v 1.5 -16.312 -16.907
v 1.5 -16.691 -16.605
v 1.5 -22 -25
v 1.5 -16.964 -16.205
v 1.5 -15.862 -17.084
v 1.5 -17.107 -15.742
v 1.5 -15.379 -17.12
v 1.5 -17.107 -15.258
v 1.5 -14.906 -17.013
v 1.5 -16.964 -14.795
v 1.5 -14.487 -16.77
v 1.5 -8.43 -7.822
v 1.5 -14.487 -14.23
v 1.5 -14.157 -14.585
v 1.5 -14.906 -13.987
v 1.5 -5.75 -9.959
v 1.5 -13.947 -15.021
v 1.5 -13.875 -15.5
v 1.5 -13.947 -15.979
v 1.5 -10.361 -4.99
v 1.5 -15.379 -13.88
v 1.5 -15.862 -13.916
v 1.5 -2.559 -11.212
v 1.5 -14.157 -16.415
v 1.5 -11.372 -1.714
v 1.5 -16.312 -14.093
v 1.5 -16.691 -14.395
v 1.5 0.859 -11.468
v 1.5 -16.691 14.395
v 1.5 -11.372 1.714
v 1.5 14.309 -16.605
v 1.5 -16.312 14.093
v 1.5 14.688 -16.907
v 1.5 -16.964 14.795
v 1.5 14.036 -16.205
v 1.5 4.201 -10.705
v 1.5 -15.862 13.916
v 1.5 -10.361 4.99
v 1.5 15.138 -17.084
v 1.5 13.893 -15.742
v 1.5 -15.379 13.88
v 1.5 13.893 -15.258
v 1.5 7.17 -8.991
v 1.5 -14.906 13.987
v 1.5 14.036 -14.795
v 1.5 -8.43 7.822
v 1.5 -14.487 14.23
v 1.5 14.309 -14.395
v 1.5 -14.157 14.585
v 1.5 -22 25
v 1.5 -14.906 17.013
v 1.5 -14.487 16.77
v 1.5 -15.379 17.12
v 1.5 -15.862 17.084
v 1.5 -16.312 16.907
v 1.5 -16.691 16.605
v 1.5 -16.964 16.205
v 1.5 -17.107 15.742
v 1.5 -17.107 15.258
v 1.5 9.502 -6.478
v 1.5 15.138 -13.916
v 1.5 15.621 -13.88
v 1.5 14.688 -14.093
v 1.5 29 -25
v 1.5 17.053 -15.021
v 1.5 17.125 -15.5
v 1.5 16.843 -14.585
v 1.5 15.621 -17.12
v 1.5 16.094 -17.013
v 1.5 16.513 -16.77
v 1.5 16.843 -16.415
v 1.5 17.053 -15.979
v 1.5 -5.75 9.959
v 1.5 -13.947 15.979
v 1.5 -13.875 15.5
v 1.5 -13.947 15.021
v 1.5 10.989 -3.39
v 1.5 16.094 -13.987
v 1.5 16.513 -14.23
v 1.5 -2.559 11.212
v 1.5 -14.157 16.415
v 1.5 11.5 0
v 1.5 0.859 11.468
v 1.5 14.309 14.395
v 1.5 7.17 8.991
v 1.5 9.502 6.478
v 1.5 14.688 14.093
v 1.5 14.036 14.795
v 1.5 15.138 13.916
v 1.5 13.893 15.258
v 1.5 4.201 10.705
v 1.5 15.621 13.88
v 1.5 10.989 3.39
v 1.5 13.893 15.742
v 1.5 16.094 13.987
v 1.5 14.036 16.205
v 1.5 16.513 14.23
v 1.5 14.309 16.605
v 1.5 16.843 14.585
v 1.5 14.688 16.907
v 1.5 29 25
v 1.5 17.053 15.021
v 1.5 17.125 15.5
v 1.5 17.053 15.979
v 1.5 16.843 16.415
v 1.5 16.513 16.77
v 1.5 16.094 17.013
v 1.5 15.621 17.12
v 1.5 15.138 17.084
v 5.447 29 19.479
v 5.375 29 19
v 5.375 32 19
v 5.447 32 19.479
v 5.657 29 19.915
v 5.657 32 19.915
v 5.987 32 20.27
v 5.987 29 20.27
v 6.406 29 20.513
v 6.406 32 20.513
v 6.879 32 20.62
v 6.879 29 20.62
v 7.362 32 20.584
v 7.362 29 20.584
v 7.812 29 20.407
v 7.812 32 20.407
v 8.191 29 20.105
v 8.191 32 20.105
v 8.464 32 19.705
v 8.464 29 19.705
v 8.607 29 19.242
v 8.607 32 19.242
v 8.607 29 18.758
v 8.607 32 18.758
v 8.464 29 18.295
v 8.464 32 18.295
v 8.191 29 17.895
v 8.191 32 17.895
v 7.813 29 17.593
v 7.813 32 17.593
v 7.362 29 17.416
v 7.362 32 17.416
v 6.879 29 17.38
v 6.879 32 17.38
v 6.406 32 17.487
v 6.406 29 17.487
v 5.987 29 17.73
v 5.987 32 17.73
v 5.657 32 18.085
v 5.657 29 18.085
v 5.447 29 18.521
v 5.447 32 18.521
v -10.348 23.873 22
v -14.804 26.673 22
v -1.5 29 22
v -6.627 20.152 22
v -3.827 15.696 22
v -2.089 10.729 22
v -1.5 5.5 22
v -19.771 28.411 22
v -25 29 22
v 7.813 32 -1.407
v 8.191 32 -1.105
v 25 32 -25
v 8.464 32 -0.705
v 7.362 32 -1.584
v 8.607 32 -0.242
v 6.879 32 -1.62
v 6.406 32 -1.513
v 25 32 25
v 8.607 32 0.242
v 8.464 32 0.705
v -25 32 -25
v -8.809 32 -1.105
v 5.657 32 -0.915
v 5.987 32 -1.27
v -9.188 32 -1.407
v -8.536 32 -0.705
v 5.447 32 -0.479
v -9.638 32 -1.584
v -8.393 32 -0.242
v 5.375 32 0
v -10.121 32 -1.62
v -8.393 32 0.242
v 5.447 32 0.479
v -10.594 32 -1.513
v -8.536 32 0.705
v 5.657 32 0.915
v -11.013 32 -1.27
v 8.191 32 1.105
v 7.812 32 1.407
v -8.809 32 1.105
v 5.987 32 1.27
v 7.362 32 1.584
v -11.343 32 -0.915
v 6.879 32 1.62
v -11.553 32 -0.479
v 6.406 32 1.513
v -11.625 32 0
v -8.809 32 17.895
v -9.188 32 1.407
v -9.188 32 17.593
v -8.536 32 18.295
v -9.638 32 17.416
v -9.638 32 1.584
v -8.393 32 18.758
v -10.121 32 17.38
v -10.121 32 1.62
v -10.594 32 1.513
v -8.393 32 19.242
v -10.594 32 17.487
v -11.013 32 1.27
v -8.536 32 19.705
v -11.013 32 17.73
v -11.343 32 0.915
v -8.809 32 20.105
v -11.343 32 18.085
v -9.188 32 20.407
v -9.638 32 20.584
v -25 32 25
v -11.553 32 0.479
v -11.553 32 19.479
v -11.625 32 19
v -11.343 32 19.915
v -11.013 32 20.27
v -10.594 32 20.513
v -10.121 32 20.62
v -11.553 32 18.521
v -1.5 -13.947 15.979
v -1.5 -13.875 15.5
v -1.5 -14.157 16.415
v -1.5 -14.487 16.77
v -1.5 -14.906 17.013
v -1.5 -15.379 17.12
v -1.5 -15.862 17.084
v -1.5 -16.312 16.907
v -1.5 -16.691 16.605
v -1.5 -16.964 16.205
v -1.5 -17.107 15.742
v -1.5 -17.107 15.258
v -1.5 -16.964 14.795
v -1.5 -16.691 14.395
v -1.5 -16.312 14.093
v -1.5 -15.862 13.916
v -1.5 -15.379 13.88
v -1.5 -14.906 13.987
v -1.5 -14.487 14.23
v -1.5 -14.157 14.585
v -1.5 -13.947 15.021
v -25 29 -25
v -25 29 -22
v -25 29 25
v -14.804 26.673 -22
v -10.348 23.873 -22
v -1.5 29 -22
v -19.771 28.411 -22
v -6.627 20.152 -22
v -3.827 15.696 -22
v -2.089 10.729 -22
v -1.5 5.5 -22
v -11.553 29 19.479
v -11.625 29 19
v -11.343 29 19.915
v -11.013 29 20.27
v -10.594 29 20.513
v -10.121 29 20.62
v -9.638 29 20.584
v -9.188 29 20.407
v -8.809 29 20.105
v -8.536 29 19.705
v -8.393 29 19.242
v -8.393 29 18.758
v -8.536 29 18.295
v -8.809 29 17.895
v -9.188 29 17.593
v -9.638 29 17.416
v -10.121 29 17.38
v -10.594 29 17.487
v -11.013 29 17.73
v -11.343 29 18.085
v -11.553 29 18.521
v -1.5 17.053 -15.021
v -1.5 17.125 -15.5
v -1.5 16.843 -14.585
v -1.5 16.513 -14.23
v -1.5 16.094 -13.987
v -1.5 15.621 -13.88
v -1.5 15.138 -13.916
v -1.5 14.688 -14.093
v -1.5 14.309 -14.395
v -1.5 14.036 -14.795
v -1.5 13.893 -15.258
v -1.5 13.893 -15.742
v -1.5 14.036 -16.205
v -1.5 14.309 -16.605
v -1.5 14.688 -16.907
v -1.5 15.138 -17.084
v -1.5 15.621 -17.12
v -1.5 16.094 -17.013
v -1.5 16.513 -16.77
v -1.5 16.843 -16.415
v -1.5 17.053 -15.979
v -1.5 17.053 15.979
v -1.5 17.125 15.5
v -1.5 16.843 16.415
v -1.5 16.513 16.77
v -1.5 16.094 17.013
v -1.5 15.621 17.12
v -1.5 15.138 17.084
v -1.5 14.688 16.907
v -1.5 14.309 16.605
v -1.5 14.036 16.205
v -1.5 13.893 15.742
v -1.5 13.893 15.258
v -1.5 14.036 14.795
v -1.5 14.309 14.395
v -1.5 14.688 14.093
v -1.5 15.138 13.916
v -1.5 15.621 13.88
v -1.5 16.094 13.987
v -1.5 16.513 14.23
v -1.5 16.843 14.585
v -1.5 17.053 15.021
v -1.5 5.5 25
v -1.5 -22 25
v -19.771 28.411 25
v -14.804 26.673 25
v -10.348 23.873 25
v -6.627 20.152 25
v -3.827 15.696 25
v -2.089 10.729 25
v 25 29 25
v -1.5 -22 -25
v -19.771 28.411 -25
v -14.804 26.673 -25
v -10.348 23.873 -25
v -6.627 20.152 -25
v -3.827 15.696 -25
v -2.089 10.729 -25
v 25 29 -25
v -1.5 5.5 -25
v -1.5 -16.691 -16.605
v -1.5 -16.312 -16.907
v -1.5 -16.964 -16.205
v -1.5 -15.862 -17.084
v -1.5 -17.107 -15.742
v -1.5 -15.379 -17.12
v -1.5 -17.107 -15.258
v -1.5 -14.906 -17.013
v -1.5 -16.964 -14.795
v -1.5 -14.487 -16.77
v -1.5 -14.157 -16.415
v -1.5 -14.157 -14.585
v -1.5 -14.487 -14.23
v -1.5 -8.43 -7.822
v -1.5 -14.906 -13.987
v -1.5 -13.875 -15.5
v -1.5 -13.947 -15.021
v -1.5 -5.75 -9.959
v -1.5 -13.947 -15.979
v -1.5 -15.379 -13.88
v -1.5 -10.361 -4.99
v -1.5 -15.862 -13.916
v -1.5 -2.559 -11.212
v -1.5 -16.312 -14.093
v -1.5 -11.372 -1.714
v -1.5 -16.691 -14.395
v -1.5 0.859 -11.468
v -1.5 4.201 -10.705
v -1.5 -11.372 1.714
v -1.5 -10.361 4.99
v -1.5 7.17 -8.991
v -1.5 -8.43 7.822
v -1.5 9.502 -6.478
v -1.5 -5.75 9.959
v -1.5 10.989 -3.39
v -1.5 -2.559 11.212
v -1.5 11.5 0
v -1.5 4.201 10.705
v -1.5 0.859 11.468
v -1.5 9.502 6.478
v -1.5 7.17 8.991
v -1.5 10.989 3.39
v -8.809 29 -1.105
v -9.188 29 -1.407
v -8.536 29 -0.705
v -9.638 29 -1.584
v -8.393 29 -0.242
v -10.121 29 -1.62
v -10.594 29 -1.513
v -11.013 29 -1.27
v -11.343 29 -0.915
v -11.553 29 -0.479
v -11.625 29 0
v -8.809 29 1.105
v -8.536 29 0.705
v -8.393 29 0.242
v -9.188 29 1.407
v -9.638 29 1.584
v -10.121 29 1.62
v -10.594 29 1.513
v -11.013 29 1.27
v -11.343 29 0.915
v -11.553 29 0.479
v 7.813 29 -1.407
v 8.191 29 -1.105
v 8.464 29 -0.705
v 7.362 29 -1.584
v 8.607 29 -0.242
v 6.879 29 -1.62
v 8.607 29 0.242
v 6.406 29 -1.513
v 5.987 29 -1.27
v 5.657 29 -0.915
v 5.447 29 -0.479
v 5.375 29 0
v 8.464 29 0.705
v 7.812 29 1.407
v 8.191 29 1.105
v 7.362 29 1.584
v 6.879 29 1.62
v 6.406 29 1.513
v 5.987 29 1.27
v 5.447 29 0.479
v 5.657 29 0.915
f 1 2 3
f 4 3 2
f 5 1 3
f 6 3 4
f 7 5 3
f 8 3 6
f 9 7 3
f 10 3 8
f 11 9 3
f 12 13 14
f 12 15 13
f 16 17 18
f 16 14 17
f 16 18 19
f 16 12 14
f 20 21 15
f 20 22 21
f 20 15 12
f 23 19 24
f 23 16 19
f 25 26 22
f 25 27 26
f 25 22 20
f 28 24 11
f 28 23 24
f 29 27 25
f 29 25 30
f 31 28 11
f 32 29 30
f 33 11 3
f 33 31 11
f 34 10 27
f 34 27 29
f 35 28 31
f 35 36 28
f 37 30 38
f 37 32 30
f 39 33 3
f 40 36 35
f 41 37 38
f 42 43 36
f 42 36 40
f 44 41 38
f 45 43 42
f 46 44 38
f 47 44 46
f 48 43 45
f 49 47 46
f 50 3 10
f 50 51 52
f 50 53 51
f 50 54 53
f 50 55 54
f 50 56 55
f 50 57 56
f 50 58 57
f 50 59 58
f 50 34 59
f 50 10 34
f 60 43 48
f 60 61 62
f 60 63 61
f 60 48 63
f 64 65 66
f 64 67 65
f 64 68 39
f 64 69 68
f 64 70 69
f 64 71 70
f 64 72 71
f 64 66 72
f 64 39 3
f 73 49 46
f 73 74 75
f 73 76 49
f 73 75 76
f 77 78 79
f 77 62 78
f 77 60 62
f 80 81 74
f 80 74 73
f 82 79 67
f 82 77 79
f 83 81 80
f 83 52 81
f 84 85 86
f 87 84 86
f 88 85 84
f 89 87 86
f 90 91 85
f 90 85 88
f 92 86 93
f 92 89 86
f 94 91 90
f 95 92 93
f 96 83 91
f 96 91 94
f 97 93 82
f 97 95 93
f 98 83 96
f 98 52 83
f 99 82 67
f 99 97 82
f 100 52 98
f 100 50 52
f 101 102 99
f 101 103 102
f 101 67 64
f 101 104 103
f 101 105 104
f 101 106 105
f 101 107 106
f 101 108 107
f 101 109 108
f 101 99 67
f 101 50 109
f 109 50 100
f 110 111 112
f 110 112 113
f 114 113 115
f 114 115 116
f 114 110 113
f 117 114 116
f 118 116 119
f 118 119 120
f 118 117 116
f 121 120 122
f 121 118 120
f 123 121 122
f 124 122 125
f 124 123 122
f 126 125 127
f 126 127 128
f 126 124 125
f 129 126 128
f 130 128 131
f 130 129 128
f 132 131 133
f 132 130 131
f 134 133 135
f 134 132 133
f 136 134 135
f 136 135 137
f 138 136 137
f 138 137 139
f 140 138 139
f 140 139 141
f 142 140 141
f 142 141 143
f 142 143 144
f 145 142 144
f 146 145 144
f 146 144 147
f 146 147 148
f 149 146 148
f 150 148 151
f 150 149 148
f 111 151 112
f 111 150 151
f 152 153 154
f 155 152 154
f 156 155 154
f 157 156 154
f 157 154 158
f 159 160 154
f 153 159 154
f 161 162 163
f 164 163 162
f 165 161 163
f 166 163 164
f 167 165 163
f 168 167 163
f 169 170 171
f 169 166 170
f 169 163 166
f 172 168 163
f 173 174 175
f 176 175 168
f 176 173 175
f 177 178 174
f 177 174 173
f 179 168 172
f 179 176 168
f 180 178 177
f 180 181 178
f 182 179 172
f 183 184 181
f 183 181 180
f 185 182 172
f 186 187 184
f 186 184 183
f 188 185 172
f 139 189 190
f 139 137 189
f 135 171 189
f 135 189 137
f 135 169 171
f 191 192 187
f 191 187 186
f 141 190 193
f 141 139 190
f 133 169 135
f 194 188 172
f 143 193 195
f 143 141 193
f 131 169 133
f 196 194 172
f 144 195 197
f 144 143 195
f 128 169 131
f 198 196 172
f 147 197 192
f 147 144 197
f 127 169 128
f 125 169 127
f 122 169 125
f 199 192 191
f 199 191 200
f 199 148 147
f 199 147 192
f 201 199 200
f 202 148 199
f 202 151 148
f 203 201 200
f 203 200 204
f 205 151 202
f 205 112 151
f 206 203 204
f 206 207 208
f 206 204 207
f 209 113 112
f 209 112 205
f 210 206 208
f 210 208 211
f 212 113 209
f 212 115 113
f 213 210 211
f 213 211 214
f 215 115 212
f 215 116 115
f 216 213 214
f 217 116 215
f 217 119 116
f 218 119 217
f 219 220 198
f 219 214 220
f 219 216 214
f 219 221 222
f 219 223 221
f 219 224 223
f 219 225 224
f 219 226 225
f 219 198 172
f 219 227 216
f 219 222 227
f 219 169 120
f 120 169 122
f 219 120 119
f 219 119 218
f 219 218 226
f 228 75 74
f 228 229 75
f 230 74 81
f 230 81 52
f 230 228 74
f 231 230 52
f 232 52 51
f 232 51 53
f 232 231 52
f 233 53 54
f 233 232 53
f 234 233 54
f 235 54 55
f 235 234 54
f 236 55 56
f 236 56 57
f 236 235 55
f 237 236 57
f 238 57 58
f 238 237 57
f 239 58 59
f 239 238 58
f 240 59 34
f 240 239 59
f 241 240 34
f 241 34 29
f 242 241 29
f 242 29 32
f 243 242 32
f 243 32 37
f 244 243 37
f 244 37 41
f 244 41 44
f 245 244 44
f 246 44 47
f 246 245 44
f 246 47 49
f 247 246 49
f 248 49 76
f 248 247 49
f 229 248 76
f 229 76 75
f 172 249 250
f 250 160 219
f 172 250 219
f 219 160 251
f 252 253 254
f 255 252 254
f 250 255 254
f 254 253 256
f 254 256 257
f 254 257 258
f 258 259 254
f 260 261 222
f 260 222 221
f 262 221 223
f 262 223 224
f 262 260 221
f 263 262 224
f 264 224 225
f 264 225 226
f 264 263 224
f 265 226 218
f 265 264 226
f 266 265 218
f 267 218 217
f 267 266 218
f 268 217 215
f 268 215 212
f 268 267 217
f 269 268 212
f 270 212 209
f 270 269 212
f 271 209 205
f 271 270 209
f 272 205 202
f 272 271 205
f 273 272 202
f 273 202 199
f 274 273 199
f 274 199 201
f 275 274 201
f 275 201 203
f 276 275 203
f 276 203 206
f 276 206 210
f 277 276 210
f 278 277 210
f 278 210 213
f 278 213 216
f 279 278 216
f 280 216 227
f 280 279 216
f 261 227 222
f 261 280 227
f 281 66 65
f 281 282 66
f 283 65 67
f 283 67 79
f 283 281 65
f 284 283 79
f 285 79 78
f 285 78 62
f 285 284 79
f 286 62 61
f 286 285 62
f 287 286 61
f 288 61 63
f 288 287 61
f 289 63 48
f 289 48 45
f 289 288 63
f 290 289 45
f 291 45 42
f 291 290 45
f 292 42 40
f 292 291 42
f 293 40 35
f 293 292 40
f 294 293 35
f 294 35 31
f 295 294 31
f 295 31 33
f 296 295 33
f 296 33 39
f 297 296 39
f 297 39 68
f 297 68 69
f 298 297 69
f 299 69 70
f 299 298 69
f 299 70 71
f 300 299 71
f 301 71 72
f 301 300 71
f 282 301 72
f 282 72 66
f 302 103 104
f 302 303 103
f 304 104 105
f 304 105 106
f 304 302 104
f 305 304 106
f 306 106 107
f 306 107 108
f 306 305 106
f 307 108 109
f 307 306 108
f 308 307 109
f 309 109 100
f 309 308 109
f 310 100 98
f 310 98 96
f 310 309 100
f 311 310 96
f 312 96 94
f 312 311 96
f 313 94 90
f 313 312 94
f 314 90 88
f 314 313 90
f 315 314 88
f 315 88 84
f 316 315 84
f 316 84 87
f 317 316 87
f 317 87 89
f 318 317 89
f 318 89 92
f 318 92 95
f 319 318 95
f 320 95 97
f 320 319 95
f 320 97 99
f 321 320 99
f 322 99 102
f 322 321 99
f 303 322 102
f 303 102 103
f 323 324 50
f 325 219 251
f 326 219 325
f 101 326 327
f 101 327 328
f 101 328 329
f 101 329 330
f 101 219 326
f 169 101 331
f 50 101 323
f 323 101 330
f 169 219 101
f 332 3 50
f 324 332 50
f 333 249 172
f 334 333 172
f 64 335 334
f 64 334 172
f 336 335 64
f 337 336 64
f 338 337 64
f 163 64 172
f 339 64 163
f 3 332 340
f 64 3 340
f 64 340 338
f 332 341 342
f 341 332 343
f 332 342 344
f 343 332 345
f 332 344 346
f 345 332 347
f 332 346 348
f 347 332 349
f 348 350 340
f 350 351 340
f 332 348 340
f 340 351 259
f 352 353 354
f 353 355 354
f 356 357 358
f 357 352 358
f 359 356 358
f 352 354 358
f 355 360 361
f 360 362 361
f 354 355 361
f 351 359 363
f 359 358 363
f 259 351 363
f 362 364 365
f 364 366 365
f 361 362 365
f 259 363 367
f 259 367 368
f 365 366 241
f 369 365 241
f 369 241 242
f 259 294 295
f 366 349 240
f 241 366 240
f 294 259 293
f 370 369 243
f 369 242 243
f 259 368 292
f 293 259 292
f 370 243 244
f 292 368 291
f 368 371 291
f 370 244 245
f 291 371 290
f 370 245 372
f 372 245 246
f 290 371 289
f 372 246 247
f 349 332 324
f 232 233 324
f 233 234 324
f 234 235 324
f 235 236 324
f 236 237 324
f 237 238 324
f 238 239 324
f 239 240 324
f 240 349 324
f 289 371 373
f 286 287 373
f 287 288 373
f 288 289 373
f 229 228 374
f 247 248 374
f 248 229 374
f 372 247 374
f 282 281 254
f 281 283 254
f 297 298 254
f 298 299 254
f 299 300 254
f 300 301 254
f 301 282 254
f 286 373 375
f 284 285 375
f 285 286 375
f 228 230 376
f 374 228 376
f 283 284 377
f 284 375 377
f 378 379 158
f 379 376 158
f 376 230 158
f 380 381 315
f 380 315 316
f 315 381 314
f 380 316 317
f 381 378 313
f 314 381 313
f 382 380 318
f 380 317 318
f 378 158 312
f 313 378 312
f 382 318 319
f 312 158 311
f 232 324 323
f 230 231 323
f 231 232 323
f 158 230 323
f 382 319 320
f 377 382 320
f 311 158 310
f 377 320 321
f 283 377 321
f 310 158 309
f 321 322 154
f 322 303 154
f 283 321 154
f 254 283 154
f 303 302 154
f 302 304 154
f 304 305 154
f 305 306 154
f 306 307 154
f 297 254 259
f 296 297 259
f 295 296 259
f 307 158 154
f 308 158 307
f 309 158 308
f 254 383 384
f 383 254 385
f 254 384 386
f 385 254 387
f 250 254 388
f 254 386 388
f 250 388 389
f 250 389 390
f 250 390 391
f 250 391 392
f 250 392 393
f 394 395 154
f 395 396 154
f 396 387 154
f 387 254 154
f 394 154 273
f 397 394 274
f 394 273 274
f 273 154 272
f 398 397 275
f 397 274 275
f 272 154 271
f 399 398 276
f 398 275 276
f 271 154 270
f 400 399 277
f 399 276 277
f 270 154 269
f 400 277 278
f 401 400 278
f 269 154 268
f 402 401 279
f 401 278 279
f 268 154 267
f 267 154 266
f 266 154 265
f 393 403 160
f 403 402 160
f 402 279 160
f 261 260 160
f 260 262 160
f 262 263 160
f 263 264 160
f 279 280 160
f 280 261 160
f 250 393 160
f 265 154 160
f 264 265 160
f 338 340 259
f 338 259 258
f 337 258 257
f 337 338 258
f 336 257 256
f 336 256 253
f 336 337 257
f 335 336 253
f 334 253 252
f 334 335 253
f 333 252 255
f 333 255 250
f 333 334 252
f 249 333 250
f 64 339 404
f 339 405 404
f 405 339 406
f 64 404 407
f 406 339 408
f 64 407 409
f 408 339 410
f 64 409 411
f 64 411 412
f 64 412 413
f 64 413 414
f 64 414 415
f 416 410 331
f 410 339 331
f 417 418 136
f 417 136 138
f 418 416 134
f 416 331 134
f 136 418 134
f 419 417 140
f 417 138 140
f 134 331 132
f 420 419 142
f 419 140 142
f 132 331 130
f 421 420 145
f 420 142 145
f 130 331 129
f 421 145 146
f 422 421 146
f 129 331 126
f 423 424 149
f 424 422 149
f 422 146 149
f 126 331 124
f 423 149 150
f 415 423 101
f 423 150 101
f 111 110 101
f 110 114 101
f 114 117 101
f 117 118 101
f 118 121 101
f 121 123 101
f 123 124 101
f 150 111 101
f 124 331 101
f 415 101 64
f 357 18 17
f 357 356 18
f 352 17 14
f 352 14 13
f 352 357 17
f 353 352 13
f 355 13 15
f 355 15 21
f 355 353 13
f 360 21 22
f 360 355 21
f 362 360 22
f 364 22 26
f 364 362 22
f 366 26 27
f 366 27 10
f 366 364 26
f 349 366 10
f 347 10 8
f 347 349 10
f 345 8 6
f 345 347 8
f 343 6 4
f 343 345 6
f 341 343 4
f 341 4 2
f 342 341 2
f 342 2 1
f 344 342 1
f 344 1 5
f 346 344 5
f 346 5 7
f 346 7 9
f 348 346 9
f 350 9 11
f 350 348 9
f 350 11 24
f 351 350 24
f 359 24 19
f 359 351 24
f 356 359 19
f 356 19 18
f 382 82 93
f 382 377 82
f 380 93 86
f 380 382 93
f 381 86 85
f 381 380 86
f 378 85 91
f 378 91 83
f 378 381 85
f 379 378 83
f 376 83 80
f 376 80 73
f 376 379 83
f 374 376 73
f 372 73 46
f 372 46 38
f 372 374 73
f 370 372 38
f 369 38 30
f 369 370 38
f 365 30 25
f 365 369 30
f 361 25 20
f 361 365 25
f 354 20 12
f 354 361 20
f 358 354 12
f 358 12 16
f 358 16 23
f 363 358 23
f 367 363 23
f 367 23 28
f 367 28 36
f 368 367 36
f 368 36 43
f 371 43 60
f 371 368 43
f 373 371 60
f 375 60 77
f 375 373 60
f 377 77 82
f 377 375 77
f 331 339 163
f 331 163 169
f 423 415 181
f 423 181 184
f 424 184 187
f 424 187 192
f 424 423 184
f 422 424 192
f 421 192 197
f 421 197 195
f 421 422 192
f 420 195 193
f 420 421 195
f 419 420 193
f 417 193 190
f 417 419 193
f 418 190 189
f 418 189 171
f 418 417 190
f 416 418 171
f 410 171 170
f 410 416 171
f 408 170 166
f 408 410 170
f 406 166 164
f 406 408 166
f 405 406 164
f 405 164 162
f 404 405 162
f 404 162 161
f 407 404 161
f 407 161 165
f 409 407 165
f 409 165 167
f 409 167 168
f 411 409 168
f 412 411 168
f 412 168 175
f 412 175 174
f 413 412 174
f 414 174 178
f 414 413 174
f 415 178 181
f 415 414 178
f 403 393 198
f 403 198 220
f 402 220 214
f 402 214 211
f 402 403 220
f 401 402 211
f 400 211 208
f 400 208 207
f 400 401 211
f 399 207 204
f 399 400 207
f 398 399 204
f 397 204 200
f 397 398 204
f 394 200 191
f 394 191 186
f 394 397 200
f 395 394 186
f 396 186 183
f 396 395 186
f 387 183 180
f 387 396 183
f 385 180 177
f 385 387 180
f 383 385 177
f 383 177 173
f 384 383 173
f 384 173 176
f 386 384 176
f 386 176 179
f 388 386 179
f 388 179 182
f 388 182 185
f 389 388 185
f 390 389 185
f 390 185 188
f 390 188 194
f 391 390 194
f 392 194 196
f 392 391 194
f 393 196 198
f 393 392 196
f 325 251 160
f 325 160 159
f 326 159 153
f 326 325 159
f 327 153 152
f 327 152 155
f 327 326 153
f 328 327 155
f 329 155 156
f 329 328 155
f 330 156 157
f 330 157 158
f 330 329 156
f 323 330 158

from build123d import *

# Parameters (mm, degrees)
F0_W     = 51
F0_H     = 50
F0_R     = 1.625
F0_R_2   = 11.5
F1_DEPTH = 1.5
F2_W     = 50
F2_H     = 50
F2_R     = 1.625
F3_DEPTH = 3
F6_DEPTH = 3
F7_DEPTH = 3


with BuildPart() as f1:
    # F0 (on Right) → F1 (new body, symmetric)
    with BuildSketch(Plane.YZ):
        with Locations((3.5, 0)):
            Rectangle(F0_W, F0_H)
        with Locations((-15.5, -15.5)):
            Circle(F0_R, mode=Mode.SUBTRACT)
        with Locations((15.5, -15.5)):
            Circle(F0_R, mode=Mode.SUBTRACT)
        Circle(F0_R_2, mode=Mode.SUBTRACT)
        with Locations((-15.5, 15.5)):
            Circle(F0_R, mode=Mode.SUBTRACT)
        with Locations((15.5, 15.5)):
            Circle(F0_R, mode=Mode.SUBTRACT)
    extrude(amount=F1_DEPTH, both=True)

    # F2 (on face) → F3 (join)
    with BuildSketch(Plane(origin=(0, 29, 0), x_dir=(-1, 0, 0), z_dir=(0, 1, 0))):
        Rectangle(F2_W, F2_H)
        with Locations((-7, 0)):
            Circle(F2_R, mode=Mode.SUBTRACT)
        with Locations((-7, 19)):
            Circle(F2_R, mode=Mode.SUBTRACT)
        with Locations((10, 0)):
            Circle(F2_R, mode=Mode.SUBTRACT)
        with Locations((10, 19)):
            Circle(F2_R, mode=Mode.SUBTRACT)
    extrude(amount=F3_DEPTH)

    # F5 (on face) → F6 (join)
    with BuildSketch(Plane.XY.offset(25)):
        with BuildLine():
            ThreePointArc((-25, 29), (-8.382991, 22.117009), (-1.5, 5.5))
            Line((-1.5, 5.5), (-1.5, 29))
            Line((-1.5, 29), (-25, 29))
        make_face()
    extrude(amount=-F6_DEPTH)

    # F4 (on face) → F7 (join)
    with BuildSketch(Plane(origin=(0, 0, -25), x_dir=(1, 0, 0), z_dir=(0, 0, -1))):
        with BuildLine():
            ThreePointArc((-1.5, -5.5), (-8.382991, -22.117009), (-25, -29))
            Line((-25, -29), (-1.5, -29))
            Line((-1.5, -29), (-1.5, -5.5))
        make_face()
    extrude(amount=-F7_DEPTH)


solid = f1.part
